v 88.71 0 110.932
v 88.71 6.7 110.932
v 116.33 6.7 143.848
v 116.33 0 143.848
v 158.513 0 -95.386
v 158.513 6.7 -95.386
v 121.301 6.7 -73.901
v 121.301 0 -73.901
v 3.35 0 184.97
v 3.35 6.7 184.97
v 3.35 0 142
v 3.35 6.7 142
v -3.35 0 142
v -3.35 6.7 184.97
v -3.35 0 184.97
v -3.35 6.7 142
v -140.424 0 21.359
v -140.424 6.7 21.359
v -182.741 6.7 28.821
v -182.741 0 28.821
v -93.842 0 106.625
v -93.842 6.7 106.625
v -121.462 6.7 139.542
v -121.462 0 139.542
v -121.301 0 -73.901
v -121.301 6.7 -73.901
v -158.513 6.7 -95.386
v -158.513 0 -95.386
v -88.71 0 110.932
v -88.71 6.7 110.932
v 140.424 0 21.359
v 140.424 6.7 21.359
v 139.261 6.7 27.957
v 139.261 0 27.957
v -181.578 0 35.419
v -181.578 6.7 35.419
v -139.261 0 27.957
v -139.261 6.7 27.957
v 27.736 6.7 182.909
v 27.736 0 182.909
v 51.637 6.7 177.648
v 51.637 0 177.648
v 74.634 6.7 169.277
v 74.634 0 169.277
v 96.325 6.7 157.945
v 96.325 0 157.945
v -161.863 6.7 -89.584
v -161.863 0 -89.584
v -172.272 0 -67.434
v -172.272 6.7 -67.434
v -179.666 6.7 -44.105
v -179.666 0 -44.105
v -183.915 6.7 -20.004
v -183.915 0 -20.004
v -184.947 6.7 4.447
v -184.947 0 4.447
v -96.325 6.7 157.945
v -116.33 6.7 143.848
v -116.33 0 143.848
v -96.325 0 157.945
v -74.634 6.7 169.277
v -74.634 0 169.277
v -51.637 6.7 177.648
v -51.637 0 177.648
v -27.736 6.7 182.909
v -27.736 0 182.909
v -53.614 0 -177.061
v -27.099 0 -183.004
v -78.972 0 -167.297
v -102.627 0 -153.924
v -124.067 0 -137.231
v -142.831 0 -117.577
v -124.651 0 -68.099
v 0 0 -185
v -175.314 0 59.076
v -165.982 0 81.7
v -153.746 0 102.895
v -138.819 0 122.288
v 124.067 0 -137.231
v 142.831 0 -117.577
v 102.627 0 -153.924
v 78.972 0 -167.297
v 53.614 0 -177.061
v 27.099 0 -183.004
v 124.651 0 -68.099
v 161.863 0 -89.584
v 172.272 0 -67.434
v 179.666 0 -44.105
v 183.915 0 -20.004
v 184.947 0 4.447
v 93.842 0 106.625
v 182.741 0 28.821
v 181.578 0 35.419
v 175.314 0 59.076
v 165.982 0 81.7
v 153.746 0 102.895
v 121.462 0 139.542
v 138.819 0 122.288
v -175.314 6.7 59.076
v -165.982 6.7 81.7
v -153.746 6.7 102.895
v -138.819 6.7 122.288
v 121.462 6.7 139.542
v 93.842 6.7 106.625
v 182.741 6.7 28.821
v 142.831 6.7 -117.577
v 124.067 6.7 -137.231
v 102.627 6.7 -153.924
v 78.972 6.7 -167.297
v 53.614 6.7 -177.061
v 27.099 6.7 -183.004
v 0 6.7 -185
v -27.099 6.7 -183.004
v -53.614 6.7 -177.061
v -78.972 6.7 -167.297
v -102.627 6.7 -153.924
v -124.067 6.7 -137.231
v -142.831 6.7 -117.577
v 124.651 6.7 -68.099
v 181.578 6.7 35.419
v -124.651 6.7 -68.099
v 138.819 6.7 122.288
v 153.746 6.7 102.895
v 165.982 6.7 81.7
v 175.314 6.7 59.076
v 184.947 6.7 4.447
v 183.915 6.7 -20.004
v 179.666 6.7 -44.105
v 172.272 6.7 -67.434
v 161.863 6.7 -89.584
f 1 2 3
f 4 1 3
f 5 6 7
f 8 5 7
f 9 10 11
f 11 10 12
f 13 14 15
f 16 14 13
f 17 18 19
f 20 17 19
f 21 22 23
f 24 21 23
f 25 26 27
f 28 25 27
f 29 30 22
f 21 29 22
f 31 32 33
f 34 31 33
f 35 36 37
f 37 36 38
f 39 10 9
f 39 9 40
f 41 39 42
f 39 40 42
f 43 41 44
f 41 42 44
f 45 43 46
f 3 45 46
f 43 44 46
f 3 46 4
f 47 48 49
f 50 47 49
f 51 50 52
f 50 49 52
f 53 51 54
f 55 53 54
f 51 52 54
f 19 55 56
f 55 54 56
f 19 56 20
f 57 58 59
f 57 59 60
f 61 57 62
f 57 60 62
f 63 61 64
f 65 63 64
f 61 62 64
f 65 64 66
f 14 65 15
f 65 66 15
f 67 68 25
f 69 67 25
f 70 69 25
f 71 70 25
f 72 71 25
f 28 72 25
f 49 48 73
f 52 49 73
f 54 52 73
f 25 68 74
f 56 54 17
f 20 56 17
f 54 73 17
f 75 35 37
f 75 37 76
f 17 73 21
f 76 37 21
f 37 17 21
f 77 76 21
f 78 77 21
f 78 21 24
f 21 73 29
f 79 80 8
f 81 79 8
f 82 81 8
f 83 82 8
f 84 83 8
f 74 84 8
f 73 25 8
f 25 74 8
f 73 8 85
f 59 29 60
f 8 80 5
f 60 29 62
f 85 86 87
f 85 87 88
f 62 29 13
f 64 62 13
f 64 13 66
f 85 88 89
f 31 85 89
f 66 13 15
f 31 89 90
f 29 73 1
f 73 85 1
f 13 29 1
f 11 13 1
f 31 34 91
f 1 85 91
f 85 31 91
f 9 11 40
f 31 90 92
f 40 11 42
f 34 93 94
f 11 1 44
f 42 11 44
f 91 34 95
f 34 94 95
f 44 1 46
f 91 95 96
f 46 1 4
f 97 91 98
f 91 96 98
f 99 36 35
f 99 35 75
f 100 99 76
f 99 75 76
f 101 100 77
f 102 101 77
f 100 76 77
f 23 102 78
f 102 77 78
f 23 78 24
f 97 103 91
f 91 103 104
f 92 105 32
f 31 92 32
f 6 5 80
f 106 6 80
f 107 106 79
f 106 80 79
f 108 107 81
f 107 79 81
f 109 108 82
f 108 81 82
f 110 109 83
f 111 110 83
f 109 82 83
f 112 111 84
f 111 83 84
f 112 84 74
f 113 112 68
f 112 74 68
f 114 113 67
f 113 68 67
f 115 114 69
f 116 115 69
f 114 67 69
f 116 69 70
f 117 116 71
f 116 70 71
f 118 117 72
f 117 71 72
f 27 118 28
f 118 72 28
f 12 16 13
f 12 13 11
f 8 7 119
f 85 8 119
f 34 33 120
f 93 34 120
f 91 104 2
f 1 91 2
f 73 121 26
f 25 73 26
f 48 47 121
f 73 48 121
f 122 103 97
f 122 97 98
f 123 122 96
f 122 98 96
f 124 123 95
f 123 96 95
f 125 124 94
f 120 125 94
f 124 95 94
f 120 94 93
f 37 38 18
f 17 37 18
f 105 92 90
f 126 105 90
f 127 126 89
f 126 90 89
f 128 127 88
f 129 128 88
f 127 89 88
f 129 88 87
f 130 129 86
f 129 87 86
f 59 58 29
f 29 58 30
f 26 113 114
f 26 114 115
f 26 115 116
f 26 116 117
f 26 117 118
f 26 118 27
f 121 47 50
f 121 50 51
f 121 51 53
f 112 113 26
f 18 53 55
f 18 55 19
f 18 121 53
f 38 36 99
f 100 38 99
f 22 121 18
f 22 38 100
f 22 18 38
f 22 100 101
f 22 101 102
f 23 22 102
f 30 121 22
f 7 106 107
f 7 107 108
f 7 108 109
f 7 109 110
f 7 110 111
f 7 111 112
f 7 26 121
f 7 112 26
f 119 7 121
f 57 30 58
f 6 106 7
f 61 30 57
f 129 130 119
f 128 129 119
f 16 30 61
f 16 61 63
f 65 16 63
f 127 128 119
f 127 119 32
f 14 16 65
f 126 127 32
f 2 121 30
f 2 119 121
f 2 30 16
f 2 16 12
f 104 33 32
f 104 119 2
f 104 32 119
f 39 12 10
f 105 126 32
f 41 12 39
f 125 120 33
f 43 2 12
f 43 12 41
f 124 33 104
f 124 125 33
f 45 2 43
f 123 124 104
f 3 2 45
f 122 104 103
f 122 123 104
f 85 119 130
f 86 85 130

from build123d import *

# Parameters (mm, degrees)
SKETCH1_R           = 185
BOSS_EXTRUDE1_DEPTH = 6.7
SKETCH2_W           = 6.7
SKETCH2_H           = 44
CUT_EXTRUDE3_DEPTH  = 6.7


with BuildPart() as part:
    # Sketch1 → Boss-Extrude1 (new body)
    with BuildSketch(Plane(origin=(0, 0, 0), x_dir=(1, 0, 0), z_dir=(0, 1, 0))):
        with Locations(Location((0, 0, 0), (0, 0, 270))):
            Circle(SKETCH1_R)
    extrude(amount=BOSS_EXTRUDE1_DEPTH)

    # Sketch2 → Cut-Extrude3 (cut)
    with BuildSketch(Plane(origin=(0, 6.7, 0), x_dir=(1, 0, 0), z_dir=(0, 1, 0))):
        Polygon((159.405725104, 95.901185103), (121.300607337, 73.901185103), (124.650607337, 68.098814897), (162.755725104, 90.098814897), align=None)
        Polygon((122.124744286, -140.330927928), (93.84208946, -106.62497243), (88.709591691, -110.931649415), (116.992246517, -144.637604913), align=None)
        Polygon((183.755963455, -28.999455073), (140.424422323, -21.358935256), (139.260979533, -27.957147201), (182.592520665, -35.597667019), align=None)
        with Locations((0, -164)):
            Rectangle(SKETCH2_W, SKETCH2_H)
        Polygon((-116.992246517, -144.637604913), (-88.709591691, -110.931649415), (-93.84208946, -106.62497243), (-122.124744286, -140.330927928), align=None)
        Polygon((-182.592520665, -35.597667019), (-139.260979533, -27.957147201), (-140.424422323, -21.358935256), (-183.755963455, -28.999455073), align=None)
        Polygon((-162.755725104, 90.098814897), (-124.650607337, 68.098814897), (-121.300607337, 73.901185103), (-159.405725104, 95.901185103), align=None)
    extrude(amount=-CUT_EXTRUDE3_DEPTH, mode=Mode.SUBTRACT)


solid = part.part
